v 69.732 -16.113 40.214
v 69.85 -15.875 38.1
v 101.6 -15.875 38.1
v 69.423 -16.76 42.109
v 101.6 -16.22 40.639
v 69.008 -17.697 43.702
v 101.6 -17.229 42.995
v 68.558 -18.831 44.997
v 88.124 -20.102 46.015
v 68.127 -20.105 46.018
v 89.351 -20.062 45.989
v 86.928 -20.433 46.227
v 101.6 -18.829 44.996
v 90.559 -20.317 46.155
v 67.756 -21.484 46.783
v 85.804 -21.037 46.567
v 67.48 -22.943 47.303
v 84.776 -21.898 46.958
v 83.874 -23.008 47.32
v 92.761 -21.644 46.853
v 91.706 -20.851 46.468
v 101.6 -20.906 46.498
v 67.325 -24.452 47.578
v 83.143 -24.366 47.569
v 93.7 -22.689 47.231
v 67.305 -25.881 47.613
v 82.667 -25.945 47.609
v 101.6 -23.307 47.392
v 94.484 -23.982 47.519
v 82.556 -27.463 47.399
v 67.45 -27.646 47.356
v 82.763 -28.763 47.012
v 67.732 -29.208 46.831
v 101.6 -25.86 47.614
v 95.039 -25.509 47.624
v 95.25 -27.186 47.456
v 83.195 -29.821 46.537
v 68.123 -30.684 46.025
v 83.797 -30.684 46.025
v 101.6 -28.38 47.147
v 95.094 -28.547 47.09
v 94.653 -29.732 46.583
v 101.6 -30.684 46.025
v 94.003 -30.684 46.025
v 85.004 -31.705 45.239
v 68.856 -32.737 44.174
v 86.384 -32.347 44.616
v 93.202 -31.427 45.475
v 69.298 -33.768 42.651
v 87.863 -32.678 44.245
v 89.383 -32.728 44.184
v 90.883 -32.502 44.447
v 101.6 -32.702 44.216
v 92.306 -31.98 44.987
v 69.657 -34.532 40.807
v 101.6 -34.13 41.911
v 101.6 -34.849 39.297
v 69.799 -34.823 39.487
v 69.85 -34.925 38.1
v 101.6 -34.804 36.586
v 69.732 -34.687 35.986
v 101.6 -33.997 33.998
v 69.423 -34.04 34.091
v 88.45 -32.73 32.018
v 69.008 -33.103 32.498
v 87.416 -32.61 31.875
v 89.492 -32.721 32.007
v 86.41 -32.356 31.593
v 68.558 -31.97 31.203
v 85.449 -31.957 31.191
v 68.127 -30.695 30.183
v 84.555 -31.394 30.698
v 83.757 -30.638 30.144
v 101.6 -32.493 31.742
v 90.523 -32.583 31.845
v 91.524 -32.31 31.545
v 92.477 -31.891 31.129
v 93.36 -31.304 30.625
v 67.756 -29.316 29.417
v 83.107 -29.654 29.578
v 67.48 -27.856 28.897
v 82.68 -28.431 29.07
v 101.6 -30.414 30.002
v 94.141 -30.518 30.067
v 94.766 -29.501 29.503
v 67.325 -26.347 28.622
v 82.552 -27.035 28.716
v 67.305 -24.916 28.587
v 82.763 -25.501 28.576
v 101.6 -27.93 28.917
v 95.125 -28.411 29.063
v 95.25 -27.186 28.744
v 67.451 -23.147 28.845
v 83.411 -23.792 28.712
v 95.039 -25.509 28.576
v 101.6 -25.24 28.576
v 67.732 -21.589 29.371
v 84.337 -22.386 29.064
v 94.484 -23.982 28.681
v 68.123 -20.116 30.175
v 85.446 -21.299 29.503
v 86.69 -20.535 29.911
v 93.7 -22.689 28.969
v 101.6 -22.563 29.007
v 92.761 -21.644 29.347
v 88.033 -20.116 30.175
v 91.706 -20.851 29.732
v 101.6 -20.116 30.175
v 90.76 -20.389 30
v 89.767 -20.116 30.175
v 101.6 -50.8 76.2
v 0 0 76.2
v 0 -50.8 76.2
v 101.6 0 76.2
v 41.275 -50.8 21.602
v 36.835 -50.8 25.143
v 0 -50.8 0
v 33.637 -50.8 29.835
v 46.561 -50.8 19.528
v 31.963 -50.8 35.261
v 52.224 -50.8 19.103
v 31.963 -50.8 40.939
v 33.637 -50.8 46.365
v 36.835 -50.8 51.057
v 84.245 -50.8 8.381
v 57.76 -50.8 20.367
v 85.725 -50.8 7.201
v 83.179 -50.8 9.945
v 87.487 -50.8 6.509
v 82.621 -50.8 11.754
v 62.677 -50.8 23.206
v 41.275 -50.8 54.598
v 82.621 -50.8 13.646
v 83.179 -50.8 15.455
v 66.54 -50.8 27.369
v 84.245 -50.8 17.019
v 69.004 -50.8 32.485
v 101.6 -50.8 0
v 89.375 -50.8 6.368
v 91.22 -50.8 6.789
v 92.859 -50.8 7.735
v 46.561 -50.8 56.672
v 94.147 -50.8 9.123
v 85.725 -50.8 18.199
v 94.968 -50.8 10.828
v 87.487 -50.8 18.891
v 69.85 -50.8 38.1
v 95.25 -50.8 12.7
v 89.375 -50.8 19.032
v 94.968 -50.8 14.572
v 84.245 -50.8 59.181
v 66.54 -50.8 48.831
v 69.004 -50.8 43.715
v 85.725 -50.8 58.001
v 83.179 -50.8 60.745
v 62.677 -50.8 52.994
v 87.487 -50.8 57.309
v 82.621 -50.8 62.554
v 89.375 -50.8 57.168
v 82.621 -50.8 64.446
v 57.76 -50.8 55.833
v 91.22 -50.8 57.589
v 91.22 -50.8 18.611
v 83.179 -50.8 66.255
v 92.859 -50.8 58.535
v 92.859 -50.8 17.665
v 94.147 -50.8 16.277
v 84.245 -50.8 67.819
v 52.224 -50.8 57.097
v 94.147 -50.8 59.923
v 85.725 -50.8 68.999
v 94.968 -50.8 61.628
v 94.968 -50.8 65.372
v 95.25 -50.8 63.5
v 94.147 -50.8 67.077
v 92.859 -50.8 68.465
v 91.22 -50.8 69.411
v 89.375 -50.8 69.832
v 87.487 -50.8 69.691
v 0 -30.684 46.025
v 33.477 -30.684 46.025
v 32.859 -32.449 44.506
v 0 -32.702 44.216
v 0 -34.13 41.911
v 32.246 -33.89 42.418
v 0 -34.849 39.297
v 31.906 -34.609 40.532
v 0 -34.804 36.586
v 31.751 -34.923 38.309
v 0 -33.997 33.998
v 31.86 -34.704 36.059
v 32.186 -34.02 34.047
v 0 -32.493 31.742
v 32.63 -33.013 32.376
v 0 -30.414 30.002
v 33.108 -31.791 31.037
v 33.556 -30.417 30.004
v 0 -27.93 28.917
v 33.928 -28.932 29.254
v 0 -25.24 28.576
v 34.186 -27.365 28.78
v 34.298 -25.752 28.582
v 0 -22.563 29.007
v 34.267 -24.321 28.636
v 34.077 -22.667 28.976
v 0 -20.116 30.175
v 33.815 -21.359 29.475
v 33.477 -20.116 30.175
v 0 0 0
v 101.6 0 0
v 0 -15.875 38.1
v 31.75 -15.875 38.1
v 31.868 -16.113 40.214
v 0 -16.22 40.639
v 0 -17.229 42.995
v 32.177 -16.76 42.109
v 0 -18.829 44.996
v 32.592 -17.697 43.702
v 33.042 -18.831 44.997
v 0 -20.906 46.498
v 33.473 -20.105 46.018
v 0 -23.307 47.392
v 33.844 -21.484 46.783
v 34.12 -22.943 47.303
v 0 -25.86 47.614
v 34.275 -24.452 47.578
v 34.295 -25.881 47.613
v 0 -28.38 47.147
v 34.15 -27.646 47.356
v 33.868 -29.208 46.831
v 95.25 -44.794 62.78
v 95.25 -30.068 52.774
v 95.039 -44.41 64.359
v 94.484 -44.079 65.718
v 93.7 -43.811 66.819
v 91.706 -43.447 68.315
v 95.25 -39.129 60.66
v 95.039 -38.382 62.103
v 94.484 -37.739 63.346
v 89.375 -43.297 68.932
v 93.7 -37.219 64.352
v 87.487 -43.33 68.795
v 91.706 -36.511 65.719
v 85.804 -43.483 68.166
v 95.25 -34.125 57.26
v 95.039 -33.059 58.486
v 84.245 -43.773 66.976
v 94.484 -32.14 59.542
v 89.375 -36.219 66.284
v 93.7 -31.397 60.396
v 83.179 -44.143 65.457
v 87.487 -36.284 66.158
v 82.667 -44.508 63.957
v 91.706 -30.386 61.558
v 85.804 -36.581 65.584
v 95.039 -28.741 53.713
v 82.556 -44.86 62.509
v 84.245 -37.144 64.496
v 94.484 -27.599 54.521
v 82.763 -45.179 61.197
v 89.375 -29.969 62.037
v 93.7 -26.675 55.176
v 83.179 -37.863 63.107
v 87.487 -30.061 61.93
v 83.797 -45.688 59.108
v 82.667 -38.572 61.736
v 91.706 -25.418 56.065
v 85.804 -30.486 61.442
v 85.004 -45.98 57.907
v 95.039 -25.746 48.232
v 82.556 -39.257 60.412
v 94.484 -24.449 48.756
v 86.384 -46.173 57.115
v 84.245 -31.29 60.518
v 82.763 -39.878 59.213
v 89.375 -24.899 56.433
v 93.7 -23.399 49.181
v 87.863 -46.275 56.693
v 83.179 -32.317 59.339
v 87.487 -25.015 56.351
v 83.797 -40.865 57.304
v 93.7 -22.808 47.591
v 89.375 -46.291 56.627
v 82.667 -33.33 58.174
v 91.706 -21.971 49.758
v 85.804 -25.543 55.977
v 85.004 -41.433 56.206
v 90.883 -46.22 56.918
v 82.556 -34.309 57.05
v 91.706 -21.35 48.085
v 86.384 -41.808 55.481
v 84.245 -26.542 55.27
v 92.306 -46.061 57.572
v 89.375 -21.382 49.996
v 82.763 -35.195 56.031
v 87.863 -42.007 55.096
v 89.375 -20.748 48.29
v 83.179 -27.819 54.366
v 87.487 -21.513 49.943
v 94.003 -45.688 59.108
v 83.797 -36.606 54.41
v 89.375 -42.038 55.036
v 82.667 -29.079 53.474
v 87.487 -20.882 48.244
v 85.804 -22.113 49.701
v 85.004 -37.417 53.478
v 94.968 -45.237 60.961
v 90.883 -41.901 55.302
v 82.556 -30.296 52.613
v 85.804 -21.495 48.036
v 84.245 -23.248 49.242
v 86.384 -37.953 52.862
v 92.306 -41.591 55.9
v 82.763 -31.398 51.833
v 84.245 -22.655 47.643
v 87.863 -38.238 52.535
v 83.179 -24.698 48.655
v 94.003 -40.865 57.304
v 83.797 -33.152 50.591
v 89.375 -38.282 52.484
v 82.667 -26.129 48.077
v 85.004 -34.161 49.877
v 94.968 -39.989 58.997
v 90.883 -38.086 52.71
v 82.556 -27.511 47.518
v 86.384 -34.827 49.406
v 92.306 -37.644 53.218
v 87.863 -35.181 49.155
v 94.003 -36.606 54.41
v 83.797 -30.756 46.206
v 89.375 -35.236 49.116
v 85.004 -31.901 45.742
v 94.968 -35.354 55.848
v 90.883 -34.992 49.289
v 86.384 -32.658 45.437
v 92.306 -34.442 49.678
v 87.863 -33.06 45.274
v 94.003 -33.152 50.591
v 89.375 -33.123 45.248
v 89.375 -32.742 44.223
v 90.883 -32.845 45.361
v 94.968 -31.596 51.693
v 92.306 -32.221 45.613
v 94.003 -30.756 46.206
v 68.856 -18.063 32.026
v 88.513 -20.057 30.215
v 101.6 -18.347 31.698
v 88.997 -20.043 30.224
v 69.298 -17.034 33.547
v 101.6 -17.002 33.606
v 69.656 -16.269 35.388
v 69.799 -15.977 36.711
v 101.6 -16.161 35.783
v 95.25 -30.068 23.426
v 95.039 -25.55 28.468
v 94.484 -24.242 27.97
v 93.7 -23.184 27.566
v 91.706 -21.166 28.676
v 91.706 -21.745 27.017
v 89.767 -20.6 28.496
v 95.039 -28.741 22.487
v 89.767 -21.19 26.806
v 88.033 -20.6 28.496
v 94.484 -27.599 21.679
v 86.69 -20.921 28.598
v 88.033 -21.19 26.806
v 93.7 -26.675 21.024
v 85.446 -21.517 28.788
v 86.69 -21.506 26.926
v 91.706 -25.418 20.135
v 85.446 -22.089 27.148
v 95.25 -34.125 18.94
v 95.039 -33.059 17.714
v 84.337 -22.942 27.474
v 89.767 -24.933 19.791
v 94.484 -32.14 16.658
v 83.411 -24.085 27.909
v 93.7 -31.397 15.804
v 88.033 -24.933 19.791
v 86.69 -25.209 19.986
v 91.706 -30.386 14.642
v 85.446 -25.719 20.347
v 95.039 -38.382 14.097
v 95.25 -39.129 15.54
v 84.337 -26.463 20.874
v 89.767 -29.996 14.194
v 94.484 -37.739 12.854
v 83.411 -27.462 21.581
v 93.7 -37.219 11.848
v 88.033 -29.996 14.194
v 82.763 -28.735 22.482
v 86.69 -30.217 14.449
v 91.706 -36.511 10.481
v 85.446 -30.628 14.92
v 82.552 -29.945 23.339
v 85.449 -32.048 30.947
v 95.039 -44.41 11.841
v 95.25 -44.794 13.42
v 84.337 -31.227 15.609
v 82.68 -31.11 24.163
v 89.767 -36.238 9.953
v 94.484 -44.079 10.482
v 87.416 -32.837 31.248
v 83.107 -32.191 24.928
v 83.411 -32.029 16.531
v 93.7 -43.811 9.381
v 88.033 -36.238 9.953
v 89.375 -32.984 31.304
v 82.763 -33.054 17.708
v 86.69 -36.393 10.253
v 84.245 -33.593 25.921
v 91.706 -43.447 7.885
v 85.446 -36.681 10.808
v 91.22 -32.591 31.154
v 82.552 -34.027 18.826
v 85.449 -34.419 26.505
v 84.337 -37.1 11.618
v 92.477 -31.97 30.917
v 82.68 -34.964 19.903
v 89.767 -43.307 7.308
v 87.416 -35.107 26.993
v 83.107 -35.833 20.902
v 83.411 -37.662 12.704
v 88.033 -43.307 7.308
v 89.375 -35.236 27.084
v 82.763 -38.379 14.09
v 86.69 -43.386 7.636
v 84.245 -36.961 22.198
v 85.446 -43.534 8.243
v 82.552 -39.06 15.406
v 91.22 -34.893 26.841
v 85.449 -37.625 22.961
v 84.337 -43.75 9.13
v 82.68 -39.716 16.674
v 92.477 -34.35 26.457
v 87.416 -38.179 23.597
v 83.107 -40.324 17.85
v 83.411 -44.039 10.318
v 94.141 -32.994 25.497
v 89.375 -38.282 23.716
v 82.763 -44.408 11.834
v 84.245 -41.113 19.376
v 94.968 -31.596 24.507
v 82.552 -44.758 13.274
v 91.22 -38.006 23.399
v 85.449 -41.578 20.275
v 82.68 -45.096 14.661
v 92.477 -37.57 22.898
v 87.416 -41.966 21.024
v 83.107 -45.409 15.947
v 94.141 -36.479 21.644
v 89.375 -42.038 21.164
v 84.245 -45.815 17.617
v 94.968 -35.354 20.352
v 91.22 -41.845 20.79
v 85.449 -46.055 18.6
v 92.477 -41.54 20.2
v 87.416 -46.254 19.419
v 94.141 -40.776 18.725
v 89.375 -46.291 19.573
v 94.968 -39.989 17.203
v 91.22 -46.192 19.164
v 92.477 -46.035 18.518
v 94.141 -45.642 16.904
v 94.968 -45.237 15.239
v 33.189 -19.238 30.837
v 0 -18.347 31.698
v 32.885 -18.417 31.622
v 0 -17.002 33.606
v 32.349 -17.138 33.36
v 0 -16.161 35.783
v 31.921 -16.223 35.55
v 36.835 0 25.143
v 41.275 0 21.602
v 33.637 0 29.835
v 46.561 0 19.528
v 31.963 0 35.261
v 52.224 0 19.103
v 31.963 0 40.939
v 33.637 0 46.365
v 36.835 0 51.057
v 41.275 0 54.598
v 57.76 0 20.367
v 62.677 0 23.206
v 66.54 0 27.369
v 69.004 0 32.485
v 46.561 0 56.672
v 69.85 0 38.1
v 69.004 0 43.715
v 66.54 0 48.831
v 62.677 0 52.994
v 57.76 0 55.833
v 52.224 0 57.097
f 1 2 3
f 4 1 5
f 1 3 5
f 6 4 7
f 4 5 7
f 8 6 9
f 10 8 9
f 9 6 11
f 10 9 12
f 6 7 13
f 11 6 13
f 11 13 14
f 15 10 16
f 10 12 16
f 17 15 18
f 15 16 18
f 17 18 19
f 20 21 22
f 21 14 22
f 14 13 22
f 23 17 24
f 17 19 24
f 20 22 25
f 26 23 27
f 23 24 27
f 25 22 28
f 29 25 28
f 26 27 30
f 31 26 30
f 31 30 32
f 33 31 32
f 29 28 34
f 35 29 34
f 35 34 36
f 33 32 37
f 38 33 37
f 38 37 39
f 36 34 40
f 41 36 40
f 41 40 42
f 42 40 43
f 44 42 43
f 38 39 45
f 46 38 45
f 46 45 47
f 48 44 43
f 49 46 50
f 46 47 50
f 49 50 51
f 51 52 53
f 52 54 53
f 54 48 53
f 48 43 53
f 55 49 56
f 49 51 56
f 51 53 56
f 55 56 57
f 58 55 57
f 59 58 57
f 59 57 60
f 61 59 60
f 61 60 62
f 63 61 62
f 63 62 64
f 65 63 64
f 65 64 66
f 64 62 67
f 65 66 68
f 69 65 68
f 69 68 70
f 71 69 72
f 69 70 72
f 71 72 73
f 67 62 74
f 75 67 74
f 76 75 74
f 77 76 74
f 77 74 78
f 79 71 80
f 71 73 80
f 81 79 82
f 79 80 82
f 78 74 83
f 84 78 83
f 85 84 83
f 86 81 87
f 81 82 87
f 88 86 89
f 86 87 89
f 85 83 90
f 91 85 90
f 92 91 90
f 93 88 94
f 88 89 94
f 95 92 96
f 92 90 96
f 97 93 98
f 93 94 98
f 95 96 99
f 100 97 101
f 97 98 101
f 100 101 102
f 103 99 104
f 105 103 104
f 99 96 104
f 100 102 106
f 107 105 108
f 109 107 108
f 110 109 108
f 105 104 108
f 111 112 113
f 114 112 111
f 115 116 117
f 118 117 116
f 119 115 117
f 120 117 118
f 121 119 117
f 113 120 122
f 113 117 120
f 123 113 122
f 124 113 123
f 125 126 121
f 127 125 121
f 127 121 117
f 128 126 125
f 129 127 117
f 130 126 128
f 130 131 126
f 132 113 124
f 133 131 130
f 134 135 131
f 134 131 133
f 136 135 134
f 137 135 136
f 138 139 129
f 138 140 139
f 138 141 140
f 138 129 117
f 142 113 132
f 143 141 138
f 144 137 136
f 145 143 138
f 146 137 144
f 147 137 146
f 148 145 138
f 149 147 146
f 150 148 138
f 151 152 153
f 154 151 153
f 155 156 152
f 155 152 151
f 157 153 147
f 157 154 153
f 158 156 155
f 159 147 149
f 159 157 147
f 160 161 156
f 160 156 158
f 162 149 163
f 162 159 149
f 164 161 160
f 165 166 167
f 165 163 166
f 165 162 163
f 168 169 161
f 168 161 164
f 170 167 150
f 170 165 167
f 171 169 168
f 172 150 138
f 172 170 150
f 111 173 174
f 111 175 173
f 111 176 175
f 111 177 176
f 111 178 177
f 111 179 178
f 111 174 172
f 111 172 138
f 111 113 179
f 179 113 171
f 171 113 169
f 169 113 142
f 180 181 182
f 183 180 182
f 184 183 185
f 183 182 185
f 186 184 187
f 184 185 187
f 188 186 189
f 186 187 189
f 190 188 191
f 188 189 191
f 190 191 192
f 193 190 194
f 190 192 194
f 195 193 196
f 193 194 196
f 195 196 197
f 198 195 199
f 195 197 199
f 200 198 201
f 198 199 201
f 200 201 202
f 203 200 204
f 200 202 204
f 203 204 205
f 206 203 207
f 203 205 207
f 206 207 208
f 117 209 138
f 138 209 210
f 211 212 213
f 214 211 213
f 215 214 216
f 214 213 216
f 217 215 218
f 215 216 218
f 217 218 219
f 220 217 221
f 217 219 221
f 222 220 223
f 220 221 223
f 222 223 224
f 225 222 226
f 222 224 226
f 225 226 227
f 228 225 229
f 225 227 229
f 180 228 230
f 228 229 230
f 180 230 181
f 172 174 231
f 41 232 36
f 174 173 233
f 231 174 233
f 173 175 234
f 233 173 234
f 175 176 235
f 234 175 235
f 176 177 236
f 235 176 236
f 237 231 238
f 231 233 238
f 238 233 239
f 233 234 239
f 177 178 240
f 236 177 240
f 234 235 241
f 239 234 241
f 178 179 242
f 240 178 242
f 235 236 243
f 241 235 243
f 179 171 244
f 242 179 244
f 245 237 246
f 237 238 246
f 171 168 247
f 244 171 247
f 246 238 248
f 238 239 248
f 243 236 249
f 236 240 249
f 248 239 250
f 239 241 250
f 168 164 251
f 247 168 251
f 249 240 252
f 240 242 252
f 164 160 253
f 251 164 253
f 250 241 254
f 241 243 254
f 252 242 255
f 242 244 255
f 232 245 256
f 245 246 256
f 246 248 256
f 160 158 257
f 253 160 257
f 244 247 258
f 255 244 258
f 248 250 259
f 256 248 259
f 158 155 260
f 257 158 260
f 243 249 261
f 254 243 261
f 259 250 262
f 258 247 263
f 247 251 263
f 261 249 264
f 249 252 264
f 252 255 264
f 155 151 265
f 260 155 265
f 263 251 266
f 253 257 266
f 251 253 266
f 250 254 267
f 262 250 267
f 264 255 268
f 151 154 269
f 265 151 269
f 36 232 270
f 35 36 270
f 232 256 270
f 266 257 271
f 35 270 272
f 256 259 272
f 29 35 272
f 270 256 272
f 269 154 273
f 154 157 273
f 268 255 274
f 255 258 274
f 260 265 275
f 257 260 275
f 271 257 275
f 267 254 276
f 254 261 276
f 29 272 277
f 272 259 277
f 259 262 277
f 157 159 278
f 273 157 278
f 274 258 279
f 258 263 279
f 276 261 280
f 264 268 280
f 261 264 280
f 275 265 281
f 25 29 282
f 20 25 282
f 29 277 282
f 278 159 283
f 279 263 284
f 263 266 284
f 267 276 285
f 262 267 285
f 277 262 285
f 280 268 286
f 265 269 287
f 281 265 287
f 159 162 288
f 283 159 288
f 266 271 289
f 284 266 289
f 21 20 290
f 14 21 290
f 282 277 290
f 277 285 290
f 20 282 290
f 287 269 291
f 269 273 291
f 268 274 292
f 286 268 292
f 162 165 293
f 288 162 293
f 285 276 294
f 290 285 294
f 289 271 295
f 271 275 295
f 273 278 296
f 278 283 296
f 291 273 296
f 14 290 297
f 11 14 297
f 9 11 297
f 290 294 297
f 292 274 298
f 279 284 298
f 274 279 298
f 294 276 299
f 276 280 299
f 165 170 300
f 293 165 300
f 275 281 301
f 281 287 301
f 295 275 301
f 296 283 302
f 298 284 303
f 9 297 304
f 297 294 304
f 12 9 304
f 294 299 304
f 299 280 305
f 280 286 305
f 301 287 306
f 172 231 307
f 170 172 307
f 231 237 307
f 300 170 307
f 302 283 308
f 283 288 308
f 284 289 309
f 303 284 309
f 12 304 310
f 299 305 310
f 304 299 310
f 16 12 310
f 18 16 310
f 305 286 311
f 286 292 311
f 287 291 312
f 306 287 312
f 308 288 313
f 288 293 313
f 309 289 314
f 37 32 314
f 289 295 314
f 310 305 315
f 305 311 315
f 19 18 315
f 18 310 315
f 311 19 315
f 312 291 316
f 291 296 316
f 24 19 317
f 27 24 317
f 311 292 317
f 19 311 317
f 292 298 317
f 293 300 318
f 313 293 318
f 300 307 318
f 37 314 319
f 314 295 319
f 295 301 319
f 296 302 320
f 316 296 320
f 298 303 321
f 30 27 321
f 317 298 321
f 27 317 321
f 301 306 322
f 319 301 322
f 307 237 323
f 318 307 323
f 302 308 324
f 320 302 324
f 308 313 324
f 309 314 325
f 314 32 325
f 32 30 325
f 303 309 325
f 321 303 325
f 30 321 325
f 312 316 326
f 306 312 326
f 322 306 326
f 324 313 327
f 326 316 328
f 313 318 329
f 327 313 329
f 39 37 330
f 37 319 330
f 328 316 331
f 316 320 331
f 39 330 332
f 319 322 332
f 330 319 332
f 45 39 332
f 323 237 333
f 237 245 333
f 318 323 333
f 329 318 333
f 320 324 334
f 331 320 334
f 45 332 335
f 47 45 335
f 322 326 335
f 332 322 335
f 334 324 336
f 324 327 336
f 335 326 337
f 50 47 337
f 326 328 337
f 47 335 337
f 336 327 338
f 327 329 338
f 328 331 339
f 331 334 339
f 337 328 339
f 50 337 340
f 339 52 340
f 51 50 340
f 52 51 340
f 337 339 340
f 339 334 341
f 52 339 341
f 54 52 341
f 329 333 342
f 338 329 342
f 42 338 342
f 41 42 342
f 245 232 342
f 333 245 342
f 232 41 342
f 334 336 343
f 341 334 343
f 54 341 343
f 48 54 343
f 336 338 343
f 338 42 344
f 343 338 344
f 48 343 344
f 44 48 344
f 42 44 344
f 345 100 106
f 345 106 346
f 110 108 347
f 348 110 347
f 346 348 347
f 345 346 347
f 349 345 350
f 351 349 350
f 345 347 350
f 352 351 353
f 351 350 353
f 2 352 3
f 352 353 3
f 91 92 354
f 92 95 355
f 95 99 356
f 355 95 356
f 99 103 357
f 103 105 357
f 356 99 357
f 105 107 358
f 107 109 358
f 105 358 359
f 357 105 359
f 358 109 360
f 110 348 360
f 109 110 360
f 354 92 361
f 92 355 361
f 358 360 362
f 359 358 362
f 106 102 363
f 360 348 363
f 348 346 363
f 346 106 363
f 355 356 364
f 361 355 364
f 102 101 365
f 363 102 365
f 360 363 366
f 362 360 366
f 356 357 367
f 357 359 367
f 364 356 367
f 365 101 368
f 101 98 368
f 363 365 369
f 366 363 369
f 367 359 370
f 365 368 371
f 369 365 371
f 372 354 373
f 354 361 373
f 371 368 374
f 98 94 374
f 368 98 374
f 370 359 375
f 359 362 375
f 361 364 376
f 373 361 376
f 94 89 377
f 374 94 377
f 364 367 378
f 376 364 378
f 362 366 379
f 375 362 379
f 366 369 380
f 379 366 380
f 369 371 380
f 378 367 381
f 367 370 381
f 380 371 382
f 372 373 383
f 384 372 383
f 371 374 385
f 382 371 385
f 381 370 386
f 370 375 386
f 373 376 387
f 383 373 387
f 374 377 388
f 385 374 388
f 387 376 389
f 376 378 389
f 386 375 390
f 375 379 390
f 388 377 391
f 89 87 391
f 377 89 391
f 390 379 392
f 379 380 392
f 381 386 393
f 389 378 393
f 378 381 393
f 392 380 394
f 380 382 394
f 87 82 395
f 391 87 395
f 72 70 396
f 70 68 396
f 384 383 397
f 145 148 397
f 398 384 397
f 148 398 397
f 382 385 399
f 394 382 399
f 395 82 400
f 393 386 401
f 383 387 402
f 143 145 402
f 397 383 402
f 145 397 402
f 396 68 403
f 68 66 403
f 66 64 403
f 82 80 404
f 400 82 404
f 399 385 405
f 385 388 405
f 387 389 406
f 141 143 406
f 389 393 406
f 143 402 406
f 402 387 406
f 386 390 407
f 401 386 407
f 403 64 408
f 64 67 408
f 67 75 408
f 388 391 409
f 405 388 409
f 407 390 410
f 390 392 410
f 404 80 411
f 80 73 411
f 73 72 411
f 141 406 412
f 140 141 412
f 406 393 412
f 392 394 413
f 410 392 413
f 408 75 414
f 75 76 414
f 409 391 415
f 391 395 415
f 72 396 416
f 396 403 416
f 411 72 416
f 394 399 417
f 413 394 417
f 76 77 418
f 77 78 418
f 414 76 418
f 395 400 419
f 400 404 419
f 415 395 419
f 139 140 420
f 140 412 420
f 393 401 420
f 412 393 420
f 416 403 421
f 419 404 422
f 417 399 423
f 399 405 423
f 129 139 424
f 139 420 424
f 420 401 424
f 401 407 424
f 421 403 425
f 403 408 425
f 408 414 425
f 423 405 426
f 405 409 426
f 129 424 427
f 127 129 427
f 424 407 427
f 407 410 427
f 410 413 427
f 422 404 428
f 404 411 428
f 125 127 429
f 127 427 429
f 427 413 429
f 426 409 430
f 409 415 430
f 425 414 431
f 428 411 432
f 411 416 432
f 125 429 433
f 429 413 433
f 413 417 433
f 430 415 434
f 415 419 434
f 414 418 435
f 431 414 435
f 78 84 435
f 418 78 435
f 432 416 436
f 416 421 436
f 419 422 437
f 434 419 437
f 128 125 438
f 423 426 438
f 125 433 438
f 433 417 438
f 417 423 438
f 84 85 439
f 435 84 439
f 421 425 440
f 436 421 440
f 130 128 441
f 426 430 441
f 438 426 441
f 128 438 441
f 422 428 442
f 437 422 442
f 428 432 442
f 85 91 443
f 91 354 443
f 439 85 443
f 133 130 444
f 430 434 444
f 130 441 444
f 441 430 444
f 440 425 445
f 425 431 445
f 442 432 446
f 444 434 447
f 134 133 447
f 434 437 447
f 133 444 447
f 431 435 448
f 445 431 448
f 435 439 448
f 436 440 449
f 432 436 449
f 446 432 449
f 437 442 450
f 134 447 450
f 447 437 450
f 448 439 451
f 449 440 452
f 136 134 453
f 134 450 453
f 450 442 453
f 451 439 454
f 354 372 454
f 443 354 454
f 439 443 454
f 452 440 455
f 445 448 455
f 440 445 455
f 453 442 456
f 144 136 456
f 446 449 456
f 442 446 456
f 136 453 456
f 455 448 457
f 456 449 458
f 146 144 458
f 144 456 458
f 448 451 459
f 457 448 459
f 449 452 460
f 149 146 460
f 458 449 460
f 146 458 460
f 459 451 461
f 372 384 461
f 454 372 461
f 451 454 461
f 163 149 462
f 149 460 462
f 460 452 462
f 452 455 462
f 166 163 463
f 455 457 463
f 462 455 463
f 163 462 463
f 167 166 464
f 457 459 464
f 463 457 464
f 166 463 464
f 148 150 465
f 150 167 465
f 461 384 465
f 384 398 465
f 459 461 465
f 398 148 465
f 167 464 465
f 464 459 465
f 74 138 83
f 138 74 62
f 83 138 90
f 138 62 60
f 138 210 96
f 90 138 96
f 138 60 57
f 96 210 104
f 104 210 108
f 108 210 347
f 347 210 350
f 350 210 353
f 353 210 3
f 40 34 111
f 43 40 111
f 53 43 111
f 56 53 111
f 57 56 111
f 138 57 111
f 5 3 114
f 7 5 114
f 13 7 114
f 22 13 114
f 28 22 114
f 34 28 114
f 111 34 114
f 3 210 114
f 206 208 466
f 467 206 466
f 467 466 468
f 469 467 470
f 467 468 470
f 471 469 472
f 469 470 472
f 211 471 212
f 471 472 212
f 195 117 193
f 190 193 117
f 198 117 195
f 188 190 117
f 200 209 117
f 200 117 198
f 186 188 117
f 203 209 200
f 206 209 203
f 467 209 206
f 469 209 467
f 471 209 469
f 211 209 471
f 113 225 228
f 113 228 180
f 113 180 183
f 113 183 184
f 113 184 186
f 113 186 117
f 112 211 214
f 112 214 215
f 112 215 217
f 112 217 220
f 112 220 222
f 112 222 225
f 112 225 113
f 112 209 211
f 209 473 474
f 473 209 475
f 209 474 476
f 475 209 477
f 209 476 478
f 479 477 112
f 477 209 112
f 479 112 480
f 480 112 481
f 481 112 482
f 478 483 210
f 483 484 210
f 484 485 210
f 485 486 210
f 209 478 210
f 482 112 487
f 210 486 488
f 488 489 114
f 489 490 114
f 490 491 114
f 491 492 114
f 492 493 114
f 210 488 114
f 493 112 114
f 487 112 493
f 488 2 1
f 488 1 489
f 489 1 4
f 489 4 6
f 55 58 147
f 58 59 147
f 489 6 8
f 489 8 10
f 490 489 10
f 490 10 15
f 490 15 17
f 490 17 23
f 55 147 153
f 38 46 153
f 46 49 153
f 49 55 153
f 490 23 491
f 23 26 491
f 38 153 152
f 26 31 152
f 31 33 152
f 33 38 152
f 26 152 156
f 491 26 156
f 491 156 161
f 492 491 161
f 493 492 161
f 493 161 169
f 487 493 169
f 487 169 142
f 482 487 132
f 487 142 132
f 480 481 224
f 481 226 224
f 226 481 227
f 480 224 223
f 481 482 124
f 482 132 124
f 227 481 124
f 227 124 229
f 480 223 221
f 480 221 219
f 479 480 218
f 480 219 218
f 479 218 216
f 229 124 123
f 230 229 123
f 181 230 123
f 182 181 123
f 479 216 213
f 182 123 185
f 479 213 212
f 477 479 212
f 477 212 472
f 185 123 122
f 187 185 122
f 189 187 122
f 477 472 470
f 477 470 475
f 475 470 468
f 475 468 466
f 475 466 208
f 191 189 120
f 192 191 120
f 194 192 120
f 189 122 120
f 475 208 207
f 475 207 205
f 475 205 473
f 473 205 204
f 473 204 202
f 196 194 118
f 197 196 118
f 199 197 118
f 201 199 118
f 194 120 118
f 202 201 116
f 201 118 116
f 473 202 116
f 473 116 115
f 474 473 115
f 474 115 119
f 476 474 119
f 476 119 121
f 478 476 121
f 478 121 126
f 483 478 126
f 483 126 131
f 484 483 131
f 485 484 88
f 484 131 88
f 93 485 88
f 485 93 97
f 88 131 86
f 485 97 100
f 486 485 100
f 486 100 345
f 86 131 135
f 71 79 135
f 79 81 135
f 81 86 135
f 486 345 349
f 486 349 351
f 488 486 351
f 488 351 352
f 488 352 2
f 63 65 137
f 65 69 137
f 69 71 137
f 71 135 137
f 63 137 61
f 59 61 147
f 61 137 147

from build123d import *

# Parameters (mm, degrees)
F0_W     = 101.6
F0_H     = 76.2
F1_DEPTH = 50.8
F2_R     = 19.05
F3_DEPTH = 50.801
F5_DEPTH = 101.601
F6_R     = 6.35


with BuildPart() as f1:
    # F0 (on Front) → F1 (new body)
    with BuildSketch(Plane.XZ):
        with Locations((50.8, 38.1)):
            Rectangle(F0_W, F0_H)
    extrude(amount=F1_DEPTH)

    # F2 (on face) → F3 (cut, through all)
    with BuildSketch(Plane.XZ.offset(50.8)):
        with Locations((50.8, 38.1)):
            Circle(F2_R)
    extrude(amount=-F3_DEPTH, mode=Mode.SUBTRACT)

    # F4 (on face) → F5 (cut, through all)
    with BuildSketch(Plane.YZ.offset(101.6)):
        with BuildLine():
            ThreePointArc((-15.875, 38.1), (-20.9055532593, 46.4979505533), (-30.683519369, 46.0252790536))
            Line((-30.683519369, 46.0252790536), (-20.116480631, 30.1747209464))
            ThreePointArc((-20.116480631, 30.1747209464), (-17.0020494467, 33.6055532593), (-15.875, 38.1))
        make_face()
        with BuildLine():
            Line((-20.116480631, 30.1747209464), (-30.683519369, 46.0252790536))
            ThreePointArc((-30.683519369, 46.0252790536), (-33.3252790536, 32.816480631), (-20.116480631, 30.1747209464))
        make_face()
    extrude(amount=-F5_DEPTH, mode=Mode.SUBTRACT)

    # F6 (on face) → F7 (revolve, cut)
    with BuildSketch(Plane.XZ.offset(50.8)):
        with Locations((88.9, 63.5)):
            Circle(F6_R)
    revolve(axis=Axis((91.8411842167, -50.8, 38.1), (-1, 0, 0)), mode=Mode.SUBTRACT)


solid = f1.part
